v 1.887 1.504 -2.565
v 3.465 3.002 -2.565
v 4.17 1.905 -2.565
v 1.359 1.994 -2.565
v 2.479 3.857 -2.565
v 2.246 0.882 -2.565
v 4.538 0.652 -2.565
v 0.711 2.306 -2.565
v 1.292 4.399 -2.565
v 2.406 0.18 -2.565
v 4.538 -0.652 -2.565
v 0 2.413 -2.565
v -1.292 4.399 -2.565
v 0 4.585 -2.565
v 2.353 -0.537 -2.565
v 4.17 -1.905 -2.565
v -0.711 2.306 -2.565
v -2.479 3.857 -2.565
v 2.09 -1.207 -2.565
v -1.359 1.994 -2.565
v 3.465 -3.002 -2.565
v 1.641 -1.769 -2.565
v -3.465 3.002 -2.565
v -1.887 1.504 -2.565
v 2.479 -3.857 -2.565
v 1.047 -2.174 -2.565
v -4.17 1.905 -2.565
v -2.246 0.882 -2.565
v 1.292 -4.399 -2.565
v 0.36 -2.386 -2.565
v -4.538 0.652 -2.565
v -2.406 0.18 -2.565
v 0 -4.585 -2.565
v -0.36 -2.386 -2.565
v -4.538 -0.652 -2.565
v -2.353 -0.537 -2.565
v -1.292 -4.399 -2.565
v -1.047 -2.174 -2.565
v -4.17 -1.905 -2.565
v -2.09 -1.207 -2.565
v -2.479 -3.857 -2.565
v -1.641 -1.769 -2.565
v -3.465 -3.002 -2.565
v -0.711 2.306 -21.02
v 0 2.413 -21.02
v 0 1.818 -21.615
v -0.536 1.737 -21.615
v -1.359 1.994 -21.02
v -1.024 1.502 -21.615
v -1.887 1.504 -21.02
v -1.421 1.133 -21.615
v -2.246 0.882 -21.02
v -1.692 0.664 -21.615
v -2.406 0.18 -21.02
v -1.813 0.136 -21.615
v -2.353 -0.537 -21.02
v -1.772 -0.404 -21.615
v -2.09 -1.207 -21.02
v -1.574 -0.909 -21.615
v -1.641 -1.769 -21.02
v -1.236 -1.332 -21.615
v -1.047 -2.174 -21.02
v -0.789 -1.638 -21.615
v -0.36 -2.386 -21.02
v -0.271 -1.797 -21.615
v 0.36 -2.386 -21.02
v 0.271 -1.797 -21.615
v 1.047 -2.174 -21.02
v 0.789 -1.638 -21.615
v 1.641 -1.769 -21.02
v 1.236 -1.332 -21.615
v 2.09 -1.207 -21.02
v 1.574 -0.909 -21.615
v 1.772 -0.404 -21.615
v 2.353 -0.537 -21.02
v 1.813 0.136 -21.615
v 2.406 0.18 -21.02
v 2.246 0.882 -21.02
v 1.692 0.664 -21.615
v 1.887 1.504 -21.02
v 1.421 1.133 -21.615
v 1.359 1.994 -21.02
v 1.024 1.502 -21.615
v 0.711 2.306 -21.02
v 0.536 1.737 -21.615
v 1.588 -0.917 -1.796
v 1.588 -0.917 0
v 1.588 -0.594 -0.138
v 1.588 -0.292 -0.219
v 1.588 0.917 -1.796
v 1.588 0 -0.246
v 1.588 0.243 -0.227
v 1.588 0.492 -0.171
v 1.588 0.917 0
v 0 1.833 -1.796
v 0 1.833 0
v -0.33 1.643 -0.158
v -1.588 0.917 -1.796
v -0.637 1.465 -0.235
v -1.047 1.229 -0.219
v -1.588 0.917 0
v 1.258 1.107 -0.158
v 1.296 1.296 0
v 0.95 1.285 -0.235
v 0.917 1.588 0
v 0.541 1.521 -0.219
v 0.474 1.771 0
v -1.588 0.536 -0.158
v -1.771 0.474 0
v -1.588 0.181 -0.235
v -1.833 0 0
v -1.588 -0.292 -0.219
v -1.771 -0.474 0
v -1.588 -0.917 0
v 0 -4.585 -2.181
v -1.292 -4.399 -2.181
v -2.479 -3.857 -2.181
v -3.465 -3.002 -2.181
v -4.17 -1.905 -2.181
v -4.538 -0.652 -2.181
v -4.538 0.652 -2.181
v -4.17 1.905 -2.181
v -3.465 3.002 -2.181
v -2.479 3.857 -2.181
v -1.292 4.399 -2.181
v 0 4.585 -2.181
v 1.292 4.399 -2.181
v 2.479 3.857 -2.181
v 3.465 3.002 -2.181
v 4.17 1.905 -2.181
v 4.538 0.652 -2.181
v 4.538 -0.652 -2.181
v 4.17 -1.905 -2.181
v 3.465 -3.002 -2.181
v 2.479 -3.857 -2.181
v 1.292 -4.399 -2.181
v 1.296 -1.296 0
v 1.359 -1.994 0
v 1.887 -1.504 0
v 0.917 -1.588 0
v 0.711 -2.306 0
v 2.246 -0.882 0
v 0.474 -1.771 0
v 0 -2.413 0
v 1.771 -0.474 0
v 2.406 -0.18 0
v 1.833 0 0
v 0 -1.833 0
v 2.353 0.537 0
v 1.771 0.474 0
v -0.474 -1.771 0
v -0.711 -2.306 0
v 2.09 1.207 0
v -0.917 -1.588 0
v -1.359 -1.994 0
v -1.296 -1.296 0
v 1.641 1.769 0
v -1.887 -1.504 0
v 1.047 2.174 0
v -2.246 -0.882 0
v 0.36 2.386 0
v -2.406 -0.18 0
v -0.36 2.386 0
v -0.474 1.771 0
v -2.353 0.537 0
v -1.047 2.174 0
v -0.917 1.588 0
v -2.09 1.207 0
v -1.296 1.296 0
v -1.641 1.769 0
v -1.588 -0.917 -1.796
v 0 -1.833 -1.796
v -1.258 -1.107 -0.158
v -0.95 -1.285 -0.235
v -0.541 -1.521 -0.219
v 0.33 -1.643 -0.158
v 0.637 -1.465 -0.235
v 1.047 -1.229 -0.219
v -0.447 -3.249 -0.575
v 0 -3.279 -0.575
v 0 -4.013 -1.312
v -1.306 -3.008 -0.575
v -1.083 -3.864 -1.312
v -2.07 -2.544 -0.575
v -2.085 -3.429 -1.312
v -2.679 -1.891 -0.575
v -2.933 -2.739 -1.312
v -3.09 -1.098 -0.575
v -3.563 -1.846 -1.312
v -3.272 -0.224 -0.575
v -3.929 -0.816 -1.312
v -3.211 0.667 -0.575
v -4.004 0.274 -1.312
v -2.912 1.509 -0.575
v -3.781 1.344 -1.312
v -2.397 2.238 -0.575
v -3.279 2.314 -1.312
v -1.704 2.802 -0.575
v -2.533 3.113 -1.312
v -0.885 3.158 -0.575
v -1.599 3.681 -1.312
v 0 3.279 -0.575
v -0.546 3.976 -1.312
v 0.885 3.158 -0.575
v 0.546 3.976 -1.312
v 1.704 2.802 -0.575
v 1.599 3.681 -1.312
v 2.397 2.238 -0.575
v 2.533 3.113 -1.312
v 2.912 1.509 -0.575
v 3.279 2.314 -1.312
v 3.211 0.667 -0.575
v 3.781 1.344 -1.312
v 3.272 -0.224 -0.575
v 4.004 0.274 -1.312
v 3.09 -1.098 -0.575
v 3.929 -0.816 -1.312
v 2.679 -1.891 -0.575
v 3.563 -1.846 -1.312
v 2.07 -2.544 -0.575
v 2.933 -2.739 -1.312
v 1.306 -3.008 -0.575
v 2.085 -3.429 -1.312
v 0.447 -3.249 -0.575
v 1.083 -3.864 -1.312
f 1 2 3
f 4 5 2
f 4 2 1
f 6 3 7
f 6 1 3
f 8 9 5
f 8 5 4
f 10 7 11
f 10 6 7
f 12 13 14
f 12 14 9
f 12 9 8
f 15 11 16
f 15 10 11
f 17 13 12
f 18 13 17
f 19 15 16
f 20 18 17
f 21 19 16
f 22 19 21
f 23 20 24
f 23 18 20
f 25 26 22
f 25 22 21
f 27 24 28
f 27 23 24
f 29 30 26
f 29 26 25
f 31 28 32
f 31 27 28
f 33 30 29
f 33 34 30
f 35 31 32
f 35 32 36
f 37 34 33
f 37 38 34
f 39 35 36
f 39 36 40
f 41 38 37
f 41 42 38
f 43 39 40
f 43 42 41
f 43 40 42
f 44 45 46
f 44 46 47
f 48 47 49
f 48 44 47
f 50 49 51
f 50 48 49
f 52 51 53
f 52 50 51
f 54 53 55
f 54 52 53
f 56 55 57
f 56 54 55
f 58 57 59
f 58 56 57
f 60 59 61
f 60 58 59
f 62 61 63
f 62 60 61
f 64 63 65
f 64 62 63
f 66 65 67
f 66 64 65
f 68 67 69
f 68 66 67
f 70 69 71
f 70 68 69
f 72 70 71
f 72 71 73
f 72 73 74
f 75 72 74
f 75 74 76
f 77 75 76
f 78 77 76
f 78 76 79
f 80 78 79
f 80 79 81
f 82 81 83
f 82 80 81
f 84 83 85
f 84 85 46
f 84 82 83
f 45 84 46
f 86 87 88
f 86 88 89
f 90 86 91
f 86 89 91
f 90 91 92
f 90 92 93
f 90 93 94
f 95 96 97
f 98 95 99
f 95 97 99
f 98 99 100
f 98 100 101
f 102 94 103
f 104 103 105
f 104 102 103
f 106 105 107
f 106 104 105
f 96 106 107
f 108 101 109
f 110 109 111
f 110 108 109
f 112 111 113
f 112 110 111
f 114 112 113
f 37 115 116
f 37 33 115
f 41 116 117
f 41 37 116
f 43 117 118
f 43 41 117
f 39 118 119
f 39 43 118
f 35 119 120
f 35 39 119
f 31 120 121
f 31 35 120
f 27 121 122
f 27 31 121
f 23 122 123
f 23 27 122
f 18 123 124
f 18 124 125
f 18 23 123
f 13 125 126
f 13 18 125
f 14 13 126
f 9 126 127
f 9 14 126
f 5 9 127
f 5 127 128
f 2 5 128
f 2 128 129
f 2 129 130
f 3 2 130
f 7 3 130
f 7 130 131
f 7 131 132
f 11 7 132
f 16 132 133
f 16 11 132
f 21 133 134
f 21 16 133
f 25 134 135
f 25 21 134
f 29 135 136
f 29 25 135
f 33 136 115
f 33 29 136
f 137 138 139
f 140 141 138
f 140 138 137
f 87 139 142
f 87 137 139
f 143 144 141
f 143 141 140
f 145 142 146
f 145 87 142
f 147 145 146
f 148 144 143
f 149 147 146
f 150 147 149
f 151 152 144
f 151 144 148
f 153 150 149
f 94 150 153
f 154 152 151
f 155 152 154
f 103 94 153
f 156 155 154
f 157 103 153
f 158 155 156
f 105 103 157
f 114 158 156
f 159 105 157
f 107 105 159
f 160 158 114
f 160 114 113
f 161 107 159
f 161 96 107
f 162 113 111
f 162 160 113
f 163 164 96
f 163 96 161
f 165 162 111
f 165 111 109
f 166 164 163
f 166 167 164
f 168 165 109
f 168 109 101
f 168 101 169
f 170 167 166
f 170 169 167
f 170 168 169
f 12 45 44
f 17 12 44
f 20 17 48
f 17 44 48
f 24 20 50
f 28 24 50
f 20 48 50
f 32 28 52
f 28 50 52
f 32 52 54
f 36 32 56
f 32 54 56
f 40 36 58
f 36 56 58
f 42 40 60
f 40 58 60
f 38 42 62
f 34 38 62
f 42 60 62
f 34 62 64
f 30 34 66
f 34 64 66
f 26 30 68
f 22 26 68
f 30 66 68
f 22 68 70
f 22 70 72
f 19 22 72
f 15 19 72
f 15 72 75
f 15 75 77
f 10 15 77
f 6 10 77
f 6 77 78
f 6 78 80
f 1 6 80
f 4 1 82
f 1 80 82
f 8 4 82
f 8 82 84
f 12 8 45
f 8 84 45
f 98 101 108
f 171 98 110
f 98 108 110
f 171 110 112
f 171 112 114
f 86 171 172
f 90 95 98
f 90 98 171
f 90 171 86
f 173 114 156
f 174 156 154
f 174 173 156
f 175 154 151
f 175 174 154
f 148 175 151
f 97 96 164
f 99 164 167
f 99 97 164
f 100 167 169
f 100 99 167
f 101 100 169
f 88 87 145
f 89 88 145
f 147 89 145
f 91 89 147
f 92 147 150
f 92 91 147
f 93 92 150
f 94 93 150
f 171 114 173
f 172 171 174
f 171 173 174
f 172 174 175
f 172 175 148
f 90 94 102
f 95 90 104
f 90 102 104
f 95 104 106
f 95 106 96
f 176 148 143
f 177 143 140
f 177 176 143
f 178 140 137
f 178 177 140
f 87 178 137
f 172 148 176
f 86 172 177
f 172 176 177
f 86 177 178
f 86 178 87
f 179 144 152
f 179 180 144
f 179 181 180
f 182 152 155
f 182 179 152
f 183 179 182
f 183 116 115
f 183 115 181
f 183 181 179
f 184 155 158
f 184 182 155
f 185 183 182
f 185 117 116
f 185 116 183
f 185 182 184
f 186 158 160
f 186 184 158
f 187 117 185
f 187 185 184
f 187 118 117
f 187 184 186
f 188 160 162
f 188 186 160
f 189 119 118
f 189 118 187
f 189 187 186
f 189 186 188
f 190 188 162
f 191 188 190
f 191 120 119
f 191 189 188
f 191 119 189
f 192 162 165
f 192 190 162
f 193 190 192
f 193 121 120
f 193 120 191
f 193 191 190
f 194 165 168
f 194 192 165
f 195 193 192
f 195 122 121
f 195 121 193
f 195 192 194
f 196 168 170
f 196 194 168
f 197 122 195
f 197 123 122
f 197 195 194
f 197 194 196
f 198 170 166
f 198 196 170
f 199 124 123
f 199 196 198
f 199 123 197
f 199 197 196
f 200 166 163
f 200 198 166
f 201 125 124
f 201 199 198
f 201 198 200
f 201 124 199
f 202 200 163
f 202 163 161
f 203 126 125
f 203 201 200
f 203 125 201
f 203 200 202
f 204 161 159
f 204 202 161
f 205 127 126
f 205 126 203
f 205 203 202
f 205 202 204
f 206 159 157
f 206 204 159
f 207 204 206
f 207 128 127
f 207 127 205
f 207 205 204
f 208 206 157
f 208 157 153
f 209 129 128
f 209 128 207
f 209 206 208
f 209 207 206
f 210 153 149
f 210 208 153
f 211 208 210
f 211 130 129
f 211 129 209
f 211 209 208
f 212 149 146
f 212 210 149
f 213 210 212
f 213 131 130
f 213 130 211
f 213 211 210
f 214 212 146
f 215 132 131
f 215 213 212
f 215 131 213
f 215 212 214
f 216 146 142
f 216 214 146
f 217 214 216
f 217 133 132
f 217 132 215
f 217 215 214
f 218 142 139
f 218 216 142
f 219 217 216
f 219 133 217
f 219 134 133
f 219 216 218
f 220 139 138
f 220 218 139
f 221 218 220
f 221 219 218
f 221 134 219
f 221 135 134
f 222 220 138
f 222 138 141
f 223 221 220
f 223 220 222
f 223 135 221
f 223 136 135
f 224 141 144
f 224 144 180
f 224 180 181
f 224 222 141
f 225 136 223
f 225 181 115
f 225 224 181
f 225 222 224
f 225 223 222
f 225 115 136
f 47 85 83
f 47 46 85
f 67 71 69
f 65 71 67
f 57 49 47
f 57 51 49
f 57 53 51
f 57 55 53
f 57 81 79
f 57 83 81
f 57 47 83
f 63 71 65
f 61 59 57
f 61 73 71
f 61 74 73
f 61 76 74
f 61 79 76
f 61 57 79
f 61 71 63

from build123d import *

# Parameters (mm, degrees)
SKETCH1_W          = 19.05
SKETCH1_H          = 2.413
CHAMFER1_SIZE      = 0.5953125
CUT_EXTRUDE2_DEPTH = 1.79578
SKETCH6_R          = 1.833087105
CUT_EXTRUDE3_DEPTH = 1.79578
CUT_EXTRUDE3_TAPER = 45


with BuildPart() as part:
    # Sketch1 → Revolve1 (revolve)
    with BuildSketch(Plane(origin=(0, 0, 0), x_dir=(0, 0, -1), z_dir=(1, 0, 0))):
        with Locations((12.0904, 1.2065)):
            Rectangle(SKETCH1_W, SKETCH1_H)
    revolve(axis=Axis((0, 0, -21.6154), (0, 0, 1)))

    # Chamfer1
    chamfer1_edges = [part.edges().sort_by_distance(p)[0] for p in [
        (0, -2.413, -21.6154),
    ]]
    chamfer(chamfer1_edges, length=CHAMFER1_SIZE)

    # Sketch7 → Revolve2 (revolve)
    with BuildSketch(Plane(origin=(0, 0, 0), x_dir=(0, 0, -1), z_dir=(1, 0, 0))):
        with BuildLine():
            Line((2.18059, 4.5847), (2.5654, 4.5847))
            Line((2.5654, 4.5847), (2.5654, 0))
            Line((2.5654, 0), (0, 0))
            Line((0, 0), (0, 2.413))
            ThreePointArc((0, 2.413), (0.925030326, 3.664791196), (2.18059, 4.5847))
        make_face()
    revolve(axis=Axis((0, 0, 0), (0, 0, -1)))

    # Sketch5 → Cut-Extrude2 (cut)
    with BuildSketch(Plane.XY):
        Polygon((1.5875, -0.916543552), (1.5875, 0.916543552), (0, 1.833087105), (-1.5875, 0.916543552), (-1.5875, -0.916543552), (0, -1.833087105), align=None)
    extrude(amount=-CUT_EXTRUDE2_DEPTH, mode=Mode.SUBTRACT)

    # Sketch6 → Cut-Extrude3 (cut)
    with BuildSketch(Plane.XY):
        Circle(SKETCH6_R)
    extrude(amount=-CUT_EXTRUDE3_DEPTH, taper=CUT_EXTRUDE3_TAPER, mode=Mode.SUBTRACT)


solid = part.part
